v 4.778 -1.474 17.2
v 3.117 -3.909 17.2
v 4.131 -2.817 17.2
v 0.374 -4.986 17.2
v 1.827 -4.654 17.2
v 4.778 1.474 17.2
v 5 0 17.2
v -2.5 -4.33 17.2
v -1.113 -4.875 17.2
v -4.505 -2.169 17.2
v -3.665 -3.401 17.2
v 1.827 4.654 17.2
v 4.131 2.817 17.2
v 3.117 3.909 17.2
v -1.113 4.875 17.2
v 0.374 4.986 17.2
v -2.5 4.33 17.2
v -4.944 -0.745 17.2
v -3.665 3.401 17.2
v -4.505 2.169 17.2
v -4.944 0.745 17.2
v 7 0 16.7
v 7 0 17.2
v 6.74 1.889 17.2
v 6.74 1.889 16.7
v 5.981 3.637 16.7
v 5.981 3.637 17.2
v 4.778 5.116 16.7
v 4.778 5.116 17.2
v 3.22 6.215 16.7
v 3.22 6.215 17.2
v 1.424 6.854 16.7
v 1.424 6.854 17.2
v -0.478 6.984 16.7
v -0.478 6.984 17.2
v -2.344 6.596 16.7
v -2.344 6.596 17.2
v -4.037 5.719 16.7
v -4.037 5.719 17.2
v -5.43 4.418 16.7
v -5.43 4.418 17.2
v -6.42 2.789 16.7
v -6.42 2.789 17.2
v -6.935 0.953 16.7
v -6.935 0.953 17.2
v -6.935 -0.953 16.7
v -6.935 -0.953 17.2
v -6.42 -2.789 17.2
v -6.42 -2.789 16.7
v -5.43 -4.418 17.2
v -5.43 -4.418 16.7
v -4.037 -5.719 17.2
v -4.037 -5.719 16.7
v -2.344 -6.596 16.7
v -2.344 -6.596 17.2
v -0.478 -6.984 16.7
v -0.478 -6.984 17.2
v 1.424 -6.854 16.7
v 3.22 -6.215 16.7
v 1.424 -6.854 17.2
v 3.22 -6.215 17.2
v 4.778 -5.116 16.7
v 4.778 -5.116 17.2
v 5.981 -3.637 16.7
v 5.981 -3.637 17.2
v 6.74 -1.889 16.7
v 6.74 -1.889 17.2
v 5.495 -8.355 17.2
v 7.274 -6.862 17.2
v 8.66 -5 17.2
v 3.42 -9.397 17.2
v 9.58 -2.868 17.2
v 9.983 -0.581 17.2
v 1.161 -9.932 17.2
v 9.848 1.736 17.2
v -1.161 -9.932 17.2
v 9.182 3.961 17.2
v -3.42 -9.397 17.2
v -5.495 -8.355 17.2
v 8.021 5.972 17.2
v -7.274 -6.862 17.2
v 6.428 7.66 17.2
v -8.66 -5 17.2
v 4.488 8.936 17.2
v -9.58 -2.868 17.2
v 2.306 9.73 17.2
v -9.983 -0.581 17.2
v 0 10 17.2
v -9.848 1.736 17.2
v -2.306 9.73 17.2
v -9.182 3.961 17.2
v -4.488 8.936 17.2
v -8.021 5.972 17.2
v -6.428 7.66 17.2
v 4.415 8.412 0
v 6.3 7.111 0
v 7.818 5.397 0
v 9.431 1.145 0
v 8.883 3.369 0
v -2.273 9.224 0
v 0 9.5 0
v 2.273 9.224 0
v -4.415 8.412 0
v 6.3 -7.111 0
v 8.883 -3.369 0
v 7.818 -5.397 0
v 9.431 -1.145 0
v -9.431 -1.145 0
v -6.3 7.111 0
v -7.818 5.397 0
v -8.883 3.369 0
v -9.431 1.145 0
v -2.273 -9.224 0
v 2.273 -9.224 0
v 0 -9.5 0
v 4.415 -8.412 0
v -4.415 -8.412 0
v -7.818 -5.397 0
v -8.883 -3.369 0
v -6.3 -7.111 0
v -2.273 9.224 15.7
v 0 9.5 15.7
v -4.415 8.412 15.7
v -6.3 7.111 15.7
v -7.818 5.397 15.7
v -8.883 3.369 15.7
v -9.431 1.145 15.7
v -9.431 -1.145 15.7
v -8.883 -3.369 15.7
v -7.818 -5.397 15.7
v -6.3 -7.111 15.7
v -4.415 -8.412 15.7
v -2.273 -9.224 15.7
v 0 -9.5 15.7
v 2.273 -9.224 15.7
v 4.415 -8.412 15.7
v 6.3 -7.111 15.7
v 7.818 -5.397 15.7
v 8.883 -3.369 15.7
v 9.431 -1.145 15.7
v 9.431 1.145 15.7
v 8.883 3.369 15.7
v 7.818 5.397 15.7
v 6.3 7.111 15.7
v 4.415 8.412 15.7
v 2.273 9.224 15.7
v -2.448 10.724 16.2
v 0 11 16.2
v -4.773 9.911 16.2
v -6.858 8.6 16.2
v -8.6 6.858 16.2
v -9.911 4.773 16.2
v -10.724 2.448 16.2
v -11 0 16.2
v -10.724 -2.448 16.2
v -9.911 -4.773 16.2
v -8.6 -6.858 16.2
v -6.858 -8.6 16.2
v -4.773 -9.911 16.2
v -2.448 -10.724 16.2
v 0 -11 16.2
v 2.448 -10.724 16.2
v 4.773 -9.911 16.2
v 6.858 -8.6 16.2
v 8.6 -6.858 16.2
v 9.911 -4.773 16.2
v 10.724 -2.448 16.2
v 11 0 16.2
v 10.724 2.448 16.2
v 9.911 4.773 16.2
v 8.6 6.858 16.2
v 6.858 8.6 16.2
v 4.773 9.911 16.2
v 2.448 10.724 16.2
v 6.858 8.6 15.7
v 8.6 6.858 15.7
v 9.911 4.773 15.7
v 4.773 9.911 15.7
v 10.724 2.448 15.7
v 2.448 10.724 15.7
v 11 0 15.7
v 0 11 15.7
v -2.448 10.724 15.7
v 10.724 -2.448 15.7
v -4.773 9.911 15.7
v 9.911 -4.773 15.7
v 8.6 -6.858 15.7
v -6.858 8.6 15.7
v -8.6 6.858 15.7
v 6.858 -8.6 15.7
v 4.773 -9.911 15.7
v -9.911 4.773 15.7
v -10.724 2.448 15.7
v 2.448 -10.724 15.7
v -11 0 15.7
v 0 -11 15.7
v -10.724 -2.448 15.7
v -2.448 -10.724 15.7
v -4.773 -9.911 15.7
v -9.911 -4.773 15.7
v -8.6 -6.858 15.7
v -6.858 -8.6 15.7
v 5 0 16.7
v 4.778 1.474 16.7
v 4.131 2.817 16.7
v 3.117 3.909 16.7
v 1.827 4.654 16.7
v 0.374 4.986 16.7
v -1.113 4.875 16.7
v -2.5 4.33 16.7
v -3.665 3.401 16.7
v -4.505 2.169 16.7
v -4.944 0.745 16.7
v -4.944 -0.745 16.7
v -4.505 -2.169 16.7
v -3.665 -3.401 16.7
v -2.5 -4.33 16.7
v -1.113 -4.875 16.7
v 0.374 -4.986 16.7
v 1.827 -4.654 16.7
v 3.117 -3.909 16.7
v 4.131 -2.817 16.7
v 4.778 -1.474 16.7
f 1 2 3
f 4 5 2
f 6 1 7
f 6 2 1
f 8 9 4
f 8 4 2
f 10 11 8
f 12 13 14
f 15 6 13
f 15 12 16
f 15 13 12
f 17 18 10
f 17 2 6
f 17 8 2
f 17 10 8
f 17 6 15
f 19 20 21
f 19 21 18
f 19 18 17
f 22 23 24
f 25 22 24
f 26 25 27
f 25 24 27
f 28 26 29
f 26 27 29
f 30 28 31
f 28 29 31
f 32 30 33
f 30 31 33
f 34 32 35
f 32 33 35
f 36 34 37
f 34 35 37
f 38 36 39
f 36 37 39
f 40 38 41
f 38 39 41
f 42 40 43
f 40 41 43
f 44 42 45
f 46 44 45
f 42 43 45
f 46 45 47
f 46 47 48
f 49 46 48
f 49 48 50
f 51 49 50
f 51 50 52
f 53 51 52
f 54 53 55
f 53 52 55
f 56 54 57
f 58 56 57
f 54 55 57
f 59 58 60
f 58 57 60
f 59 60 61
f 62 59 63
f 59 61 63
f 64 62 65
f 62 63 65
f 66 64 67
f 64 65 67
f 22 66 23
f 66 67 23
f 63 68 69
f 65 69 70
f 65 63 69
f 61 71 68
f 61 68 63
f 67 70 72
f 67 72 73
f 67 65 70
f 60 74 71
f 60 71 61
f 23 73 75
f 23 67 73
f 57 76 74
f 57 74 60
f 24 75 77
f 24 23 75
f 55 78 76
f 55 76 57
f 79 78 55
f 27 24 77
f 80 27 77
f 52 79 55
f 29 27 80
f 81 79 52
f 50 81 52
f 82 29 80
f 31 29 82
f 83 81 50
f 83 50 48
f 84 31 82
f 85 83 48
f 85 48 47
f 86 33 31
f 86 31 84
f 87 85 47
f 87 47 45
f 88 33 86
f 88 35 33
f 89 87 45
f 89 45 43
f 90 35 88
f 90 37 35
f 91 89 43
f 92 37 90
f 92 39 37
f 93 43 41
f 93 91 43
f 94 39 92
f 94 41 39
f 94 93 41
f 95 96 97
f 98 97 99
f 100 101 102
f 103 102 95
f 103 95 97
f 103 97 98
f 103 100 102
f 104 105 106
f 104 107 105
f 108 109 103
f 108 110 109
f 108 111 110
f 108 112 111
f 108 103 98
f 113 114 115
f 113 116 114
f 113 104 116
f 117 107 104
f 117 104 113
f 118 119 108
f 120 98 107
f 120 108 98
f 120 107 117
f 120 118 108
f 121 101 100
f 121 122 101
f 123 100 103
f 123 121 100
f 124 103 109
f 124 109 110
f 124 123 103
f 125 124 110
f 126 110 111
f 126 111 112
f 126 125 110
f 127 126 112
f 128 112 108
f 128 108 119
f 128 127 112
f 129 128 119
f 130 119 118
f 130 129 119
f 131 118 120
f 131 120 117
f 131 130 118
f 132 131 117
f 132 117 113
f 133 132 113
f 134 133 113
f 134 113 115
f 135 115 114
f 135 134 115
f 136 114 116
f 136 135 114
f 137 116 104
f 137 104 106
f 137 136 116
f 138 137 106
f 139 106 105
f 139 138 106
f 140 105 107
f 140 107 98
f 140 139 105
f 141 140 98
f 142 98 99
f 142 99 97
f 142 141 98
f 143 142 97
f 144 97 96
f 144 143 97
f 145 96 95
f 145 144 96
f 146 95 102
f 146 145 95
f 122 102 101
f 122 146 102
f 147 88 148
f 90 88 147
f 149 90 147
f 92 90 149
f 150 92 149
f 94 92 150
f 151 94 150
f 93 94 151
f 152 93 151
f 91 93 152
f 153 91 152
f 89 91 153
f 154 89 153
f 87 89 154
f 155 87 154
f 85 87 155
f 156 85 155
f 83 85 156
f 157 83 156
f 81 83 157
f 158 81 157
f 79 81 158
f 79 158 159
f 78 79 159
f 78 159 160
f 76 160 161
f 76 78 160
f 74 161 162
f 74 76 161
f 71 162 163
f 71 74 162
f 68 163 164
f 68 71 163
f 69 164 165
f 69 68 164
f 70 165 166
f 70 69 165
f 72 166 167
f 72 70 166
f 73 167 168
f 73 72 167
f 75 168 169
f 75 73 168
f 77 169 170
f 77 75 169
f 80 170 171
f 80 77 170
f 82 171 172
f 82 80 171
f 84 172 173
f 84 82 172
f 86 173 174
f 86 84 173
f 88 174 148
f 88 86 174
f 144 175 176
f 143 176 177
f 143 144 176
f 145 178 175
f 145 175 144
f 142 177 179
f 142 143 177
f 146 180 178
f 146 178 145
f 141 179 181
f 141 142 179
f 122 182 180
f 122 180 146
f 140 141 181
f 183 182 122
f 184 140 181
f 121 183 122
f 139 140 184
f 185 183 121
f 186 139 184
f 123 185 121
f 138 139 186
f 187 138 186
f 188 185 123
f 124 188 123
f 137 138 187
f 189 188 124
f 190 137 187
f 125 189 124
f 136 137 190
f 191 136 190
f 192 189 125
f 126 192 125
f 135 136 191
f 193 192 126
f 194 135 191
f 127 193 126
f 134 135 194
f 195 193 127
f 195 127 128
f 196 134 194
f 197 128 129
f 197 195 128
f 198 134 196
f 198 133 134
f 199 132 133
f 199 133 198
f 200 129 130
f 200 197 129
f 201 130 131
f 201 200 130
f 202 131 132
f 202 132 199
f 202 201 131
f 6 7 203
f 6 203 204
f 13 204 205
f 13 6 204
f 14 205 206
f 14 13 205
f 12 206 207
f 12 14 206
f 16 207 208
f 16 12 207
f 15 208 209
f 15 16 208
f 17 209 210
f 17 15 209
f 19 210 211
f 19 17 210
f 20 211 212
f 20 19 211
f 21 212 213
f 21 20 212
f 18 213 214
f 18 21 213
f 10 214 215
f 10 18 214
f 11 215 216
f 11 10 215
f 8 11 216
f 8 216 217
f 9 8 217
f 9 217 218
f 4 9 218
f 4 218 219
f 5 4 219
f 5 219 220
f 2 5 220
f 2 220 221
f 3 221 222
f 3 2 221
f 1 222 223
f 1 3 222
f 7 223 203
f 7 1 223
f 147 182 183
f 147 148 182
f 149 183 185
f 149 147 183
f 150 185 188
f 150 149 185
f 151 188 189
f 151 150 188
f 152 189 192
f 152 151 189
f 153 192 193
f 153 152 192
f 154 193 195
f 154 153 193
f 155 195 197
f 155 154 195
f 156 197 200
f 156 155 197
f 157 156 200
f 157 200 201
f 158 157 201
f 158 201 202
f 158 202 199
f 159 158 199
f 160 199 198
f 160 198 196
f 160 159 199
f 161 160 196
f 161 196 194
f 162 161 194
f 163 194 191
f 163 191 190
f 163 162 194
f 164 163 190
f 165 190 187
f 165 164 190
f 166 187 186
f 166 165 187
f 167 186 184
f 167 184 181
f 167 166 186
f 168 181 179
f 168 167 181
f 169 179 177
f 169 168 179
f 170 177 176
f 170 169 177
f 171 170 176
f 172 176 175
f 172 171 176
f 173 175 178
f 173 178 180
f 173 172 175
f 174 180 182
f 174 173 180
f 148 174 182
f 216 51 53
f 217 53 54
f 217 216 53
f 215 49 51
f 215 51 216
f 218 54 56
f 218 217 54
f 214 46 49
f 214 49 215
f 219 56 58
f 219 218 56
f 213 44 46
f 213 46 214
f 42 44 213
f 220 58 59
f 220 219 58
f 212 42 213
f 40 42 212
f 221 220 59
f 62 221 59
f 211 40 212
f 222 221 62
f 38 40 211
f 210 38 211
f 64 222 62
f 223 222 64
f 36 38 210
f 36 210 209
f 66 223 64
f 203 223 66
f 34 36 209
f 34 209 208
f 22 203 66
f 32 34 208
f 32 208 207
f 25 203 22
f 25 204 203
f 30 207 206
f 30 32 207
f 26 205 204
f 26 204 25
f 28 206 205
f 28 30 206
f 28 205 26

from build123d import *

# Parameters (mm, degrees)
F2_R     = 7
F2_R_2   = 5
F3_DEPTH = 0.5


with BuildPart() as f1:
    # F0 (on Right) → F1 (revolve)
    with BuildSketch(Plane.YZ):
        Polygon((0, 17.2), (0, 0), (9.5, 0), (9.5, 15.7), (11, 15.7), (11, 16.2), (10, 17.2), align=None)
    revolve(axis=Axis((0, 0, 8.6), (0, 0, 1)))

    # F2 (on face) → F3 (cut)
    with BuildSketch(Plane.XY.offset(17.2)):
        Circle(F2_R)
        Circle(F2_R_2, mode=Mode.SUBTRACT)
    extrude(amount=-F3_DEPTH, mode=Mode.SUBTRACT)


solid = f1.part
